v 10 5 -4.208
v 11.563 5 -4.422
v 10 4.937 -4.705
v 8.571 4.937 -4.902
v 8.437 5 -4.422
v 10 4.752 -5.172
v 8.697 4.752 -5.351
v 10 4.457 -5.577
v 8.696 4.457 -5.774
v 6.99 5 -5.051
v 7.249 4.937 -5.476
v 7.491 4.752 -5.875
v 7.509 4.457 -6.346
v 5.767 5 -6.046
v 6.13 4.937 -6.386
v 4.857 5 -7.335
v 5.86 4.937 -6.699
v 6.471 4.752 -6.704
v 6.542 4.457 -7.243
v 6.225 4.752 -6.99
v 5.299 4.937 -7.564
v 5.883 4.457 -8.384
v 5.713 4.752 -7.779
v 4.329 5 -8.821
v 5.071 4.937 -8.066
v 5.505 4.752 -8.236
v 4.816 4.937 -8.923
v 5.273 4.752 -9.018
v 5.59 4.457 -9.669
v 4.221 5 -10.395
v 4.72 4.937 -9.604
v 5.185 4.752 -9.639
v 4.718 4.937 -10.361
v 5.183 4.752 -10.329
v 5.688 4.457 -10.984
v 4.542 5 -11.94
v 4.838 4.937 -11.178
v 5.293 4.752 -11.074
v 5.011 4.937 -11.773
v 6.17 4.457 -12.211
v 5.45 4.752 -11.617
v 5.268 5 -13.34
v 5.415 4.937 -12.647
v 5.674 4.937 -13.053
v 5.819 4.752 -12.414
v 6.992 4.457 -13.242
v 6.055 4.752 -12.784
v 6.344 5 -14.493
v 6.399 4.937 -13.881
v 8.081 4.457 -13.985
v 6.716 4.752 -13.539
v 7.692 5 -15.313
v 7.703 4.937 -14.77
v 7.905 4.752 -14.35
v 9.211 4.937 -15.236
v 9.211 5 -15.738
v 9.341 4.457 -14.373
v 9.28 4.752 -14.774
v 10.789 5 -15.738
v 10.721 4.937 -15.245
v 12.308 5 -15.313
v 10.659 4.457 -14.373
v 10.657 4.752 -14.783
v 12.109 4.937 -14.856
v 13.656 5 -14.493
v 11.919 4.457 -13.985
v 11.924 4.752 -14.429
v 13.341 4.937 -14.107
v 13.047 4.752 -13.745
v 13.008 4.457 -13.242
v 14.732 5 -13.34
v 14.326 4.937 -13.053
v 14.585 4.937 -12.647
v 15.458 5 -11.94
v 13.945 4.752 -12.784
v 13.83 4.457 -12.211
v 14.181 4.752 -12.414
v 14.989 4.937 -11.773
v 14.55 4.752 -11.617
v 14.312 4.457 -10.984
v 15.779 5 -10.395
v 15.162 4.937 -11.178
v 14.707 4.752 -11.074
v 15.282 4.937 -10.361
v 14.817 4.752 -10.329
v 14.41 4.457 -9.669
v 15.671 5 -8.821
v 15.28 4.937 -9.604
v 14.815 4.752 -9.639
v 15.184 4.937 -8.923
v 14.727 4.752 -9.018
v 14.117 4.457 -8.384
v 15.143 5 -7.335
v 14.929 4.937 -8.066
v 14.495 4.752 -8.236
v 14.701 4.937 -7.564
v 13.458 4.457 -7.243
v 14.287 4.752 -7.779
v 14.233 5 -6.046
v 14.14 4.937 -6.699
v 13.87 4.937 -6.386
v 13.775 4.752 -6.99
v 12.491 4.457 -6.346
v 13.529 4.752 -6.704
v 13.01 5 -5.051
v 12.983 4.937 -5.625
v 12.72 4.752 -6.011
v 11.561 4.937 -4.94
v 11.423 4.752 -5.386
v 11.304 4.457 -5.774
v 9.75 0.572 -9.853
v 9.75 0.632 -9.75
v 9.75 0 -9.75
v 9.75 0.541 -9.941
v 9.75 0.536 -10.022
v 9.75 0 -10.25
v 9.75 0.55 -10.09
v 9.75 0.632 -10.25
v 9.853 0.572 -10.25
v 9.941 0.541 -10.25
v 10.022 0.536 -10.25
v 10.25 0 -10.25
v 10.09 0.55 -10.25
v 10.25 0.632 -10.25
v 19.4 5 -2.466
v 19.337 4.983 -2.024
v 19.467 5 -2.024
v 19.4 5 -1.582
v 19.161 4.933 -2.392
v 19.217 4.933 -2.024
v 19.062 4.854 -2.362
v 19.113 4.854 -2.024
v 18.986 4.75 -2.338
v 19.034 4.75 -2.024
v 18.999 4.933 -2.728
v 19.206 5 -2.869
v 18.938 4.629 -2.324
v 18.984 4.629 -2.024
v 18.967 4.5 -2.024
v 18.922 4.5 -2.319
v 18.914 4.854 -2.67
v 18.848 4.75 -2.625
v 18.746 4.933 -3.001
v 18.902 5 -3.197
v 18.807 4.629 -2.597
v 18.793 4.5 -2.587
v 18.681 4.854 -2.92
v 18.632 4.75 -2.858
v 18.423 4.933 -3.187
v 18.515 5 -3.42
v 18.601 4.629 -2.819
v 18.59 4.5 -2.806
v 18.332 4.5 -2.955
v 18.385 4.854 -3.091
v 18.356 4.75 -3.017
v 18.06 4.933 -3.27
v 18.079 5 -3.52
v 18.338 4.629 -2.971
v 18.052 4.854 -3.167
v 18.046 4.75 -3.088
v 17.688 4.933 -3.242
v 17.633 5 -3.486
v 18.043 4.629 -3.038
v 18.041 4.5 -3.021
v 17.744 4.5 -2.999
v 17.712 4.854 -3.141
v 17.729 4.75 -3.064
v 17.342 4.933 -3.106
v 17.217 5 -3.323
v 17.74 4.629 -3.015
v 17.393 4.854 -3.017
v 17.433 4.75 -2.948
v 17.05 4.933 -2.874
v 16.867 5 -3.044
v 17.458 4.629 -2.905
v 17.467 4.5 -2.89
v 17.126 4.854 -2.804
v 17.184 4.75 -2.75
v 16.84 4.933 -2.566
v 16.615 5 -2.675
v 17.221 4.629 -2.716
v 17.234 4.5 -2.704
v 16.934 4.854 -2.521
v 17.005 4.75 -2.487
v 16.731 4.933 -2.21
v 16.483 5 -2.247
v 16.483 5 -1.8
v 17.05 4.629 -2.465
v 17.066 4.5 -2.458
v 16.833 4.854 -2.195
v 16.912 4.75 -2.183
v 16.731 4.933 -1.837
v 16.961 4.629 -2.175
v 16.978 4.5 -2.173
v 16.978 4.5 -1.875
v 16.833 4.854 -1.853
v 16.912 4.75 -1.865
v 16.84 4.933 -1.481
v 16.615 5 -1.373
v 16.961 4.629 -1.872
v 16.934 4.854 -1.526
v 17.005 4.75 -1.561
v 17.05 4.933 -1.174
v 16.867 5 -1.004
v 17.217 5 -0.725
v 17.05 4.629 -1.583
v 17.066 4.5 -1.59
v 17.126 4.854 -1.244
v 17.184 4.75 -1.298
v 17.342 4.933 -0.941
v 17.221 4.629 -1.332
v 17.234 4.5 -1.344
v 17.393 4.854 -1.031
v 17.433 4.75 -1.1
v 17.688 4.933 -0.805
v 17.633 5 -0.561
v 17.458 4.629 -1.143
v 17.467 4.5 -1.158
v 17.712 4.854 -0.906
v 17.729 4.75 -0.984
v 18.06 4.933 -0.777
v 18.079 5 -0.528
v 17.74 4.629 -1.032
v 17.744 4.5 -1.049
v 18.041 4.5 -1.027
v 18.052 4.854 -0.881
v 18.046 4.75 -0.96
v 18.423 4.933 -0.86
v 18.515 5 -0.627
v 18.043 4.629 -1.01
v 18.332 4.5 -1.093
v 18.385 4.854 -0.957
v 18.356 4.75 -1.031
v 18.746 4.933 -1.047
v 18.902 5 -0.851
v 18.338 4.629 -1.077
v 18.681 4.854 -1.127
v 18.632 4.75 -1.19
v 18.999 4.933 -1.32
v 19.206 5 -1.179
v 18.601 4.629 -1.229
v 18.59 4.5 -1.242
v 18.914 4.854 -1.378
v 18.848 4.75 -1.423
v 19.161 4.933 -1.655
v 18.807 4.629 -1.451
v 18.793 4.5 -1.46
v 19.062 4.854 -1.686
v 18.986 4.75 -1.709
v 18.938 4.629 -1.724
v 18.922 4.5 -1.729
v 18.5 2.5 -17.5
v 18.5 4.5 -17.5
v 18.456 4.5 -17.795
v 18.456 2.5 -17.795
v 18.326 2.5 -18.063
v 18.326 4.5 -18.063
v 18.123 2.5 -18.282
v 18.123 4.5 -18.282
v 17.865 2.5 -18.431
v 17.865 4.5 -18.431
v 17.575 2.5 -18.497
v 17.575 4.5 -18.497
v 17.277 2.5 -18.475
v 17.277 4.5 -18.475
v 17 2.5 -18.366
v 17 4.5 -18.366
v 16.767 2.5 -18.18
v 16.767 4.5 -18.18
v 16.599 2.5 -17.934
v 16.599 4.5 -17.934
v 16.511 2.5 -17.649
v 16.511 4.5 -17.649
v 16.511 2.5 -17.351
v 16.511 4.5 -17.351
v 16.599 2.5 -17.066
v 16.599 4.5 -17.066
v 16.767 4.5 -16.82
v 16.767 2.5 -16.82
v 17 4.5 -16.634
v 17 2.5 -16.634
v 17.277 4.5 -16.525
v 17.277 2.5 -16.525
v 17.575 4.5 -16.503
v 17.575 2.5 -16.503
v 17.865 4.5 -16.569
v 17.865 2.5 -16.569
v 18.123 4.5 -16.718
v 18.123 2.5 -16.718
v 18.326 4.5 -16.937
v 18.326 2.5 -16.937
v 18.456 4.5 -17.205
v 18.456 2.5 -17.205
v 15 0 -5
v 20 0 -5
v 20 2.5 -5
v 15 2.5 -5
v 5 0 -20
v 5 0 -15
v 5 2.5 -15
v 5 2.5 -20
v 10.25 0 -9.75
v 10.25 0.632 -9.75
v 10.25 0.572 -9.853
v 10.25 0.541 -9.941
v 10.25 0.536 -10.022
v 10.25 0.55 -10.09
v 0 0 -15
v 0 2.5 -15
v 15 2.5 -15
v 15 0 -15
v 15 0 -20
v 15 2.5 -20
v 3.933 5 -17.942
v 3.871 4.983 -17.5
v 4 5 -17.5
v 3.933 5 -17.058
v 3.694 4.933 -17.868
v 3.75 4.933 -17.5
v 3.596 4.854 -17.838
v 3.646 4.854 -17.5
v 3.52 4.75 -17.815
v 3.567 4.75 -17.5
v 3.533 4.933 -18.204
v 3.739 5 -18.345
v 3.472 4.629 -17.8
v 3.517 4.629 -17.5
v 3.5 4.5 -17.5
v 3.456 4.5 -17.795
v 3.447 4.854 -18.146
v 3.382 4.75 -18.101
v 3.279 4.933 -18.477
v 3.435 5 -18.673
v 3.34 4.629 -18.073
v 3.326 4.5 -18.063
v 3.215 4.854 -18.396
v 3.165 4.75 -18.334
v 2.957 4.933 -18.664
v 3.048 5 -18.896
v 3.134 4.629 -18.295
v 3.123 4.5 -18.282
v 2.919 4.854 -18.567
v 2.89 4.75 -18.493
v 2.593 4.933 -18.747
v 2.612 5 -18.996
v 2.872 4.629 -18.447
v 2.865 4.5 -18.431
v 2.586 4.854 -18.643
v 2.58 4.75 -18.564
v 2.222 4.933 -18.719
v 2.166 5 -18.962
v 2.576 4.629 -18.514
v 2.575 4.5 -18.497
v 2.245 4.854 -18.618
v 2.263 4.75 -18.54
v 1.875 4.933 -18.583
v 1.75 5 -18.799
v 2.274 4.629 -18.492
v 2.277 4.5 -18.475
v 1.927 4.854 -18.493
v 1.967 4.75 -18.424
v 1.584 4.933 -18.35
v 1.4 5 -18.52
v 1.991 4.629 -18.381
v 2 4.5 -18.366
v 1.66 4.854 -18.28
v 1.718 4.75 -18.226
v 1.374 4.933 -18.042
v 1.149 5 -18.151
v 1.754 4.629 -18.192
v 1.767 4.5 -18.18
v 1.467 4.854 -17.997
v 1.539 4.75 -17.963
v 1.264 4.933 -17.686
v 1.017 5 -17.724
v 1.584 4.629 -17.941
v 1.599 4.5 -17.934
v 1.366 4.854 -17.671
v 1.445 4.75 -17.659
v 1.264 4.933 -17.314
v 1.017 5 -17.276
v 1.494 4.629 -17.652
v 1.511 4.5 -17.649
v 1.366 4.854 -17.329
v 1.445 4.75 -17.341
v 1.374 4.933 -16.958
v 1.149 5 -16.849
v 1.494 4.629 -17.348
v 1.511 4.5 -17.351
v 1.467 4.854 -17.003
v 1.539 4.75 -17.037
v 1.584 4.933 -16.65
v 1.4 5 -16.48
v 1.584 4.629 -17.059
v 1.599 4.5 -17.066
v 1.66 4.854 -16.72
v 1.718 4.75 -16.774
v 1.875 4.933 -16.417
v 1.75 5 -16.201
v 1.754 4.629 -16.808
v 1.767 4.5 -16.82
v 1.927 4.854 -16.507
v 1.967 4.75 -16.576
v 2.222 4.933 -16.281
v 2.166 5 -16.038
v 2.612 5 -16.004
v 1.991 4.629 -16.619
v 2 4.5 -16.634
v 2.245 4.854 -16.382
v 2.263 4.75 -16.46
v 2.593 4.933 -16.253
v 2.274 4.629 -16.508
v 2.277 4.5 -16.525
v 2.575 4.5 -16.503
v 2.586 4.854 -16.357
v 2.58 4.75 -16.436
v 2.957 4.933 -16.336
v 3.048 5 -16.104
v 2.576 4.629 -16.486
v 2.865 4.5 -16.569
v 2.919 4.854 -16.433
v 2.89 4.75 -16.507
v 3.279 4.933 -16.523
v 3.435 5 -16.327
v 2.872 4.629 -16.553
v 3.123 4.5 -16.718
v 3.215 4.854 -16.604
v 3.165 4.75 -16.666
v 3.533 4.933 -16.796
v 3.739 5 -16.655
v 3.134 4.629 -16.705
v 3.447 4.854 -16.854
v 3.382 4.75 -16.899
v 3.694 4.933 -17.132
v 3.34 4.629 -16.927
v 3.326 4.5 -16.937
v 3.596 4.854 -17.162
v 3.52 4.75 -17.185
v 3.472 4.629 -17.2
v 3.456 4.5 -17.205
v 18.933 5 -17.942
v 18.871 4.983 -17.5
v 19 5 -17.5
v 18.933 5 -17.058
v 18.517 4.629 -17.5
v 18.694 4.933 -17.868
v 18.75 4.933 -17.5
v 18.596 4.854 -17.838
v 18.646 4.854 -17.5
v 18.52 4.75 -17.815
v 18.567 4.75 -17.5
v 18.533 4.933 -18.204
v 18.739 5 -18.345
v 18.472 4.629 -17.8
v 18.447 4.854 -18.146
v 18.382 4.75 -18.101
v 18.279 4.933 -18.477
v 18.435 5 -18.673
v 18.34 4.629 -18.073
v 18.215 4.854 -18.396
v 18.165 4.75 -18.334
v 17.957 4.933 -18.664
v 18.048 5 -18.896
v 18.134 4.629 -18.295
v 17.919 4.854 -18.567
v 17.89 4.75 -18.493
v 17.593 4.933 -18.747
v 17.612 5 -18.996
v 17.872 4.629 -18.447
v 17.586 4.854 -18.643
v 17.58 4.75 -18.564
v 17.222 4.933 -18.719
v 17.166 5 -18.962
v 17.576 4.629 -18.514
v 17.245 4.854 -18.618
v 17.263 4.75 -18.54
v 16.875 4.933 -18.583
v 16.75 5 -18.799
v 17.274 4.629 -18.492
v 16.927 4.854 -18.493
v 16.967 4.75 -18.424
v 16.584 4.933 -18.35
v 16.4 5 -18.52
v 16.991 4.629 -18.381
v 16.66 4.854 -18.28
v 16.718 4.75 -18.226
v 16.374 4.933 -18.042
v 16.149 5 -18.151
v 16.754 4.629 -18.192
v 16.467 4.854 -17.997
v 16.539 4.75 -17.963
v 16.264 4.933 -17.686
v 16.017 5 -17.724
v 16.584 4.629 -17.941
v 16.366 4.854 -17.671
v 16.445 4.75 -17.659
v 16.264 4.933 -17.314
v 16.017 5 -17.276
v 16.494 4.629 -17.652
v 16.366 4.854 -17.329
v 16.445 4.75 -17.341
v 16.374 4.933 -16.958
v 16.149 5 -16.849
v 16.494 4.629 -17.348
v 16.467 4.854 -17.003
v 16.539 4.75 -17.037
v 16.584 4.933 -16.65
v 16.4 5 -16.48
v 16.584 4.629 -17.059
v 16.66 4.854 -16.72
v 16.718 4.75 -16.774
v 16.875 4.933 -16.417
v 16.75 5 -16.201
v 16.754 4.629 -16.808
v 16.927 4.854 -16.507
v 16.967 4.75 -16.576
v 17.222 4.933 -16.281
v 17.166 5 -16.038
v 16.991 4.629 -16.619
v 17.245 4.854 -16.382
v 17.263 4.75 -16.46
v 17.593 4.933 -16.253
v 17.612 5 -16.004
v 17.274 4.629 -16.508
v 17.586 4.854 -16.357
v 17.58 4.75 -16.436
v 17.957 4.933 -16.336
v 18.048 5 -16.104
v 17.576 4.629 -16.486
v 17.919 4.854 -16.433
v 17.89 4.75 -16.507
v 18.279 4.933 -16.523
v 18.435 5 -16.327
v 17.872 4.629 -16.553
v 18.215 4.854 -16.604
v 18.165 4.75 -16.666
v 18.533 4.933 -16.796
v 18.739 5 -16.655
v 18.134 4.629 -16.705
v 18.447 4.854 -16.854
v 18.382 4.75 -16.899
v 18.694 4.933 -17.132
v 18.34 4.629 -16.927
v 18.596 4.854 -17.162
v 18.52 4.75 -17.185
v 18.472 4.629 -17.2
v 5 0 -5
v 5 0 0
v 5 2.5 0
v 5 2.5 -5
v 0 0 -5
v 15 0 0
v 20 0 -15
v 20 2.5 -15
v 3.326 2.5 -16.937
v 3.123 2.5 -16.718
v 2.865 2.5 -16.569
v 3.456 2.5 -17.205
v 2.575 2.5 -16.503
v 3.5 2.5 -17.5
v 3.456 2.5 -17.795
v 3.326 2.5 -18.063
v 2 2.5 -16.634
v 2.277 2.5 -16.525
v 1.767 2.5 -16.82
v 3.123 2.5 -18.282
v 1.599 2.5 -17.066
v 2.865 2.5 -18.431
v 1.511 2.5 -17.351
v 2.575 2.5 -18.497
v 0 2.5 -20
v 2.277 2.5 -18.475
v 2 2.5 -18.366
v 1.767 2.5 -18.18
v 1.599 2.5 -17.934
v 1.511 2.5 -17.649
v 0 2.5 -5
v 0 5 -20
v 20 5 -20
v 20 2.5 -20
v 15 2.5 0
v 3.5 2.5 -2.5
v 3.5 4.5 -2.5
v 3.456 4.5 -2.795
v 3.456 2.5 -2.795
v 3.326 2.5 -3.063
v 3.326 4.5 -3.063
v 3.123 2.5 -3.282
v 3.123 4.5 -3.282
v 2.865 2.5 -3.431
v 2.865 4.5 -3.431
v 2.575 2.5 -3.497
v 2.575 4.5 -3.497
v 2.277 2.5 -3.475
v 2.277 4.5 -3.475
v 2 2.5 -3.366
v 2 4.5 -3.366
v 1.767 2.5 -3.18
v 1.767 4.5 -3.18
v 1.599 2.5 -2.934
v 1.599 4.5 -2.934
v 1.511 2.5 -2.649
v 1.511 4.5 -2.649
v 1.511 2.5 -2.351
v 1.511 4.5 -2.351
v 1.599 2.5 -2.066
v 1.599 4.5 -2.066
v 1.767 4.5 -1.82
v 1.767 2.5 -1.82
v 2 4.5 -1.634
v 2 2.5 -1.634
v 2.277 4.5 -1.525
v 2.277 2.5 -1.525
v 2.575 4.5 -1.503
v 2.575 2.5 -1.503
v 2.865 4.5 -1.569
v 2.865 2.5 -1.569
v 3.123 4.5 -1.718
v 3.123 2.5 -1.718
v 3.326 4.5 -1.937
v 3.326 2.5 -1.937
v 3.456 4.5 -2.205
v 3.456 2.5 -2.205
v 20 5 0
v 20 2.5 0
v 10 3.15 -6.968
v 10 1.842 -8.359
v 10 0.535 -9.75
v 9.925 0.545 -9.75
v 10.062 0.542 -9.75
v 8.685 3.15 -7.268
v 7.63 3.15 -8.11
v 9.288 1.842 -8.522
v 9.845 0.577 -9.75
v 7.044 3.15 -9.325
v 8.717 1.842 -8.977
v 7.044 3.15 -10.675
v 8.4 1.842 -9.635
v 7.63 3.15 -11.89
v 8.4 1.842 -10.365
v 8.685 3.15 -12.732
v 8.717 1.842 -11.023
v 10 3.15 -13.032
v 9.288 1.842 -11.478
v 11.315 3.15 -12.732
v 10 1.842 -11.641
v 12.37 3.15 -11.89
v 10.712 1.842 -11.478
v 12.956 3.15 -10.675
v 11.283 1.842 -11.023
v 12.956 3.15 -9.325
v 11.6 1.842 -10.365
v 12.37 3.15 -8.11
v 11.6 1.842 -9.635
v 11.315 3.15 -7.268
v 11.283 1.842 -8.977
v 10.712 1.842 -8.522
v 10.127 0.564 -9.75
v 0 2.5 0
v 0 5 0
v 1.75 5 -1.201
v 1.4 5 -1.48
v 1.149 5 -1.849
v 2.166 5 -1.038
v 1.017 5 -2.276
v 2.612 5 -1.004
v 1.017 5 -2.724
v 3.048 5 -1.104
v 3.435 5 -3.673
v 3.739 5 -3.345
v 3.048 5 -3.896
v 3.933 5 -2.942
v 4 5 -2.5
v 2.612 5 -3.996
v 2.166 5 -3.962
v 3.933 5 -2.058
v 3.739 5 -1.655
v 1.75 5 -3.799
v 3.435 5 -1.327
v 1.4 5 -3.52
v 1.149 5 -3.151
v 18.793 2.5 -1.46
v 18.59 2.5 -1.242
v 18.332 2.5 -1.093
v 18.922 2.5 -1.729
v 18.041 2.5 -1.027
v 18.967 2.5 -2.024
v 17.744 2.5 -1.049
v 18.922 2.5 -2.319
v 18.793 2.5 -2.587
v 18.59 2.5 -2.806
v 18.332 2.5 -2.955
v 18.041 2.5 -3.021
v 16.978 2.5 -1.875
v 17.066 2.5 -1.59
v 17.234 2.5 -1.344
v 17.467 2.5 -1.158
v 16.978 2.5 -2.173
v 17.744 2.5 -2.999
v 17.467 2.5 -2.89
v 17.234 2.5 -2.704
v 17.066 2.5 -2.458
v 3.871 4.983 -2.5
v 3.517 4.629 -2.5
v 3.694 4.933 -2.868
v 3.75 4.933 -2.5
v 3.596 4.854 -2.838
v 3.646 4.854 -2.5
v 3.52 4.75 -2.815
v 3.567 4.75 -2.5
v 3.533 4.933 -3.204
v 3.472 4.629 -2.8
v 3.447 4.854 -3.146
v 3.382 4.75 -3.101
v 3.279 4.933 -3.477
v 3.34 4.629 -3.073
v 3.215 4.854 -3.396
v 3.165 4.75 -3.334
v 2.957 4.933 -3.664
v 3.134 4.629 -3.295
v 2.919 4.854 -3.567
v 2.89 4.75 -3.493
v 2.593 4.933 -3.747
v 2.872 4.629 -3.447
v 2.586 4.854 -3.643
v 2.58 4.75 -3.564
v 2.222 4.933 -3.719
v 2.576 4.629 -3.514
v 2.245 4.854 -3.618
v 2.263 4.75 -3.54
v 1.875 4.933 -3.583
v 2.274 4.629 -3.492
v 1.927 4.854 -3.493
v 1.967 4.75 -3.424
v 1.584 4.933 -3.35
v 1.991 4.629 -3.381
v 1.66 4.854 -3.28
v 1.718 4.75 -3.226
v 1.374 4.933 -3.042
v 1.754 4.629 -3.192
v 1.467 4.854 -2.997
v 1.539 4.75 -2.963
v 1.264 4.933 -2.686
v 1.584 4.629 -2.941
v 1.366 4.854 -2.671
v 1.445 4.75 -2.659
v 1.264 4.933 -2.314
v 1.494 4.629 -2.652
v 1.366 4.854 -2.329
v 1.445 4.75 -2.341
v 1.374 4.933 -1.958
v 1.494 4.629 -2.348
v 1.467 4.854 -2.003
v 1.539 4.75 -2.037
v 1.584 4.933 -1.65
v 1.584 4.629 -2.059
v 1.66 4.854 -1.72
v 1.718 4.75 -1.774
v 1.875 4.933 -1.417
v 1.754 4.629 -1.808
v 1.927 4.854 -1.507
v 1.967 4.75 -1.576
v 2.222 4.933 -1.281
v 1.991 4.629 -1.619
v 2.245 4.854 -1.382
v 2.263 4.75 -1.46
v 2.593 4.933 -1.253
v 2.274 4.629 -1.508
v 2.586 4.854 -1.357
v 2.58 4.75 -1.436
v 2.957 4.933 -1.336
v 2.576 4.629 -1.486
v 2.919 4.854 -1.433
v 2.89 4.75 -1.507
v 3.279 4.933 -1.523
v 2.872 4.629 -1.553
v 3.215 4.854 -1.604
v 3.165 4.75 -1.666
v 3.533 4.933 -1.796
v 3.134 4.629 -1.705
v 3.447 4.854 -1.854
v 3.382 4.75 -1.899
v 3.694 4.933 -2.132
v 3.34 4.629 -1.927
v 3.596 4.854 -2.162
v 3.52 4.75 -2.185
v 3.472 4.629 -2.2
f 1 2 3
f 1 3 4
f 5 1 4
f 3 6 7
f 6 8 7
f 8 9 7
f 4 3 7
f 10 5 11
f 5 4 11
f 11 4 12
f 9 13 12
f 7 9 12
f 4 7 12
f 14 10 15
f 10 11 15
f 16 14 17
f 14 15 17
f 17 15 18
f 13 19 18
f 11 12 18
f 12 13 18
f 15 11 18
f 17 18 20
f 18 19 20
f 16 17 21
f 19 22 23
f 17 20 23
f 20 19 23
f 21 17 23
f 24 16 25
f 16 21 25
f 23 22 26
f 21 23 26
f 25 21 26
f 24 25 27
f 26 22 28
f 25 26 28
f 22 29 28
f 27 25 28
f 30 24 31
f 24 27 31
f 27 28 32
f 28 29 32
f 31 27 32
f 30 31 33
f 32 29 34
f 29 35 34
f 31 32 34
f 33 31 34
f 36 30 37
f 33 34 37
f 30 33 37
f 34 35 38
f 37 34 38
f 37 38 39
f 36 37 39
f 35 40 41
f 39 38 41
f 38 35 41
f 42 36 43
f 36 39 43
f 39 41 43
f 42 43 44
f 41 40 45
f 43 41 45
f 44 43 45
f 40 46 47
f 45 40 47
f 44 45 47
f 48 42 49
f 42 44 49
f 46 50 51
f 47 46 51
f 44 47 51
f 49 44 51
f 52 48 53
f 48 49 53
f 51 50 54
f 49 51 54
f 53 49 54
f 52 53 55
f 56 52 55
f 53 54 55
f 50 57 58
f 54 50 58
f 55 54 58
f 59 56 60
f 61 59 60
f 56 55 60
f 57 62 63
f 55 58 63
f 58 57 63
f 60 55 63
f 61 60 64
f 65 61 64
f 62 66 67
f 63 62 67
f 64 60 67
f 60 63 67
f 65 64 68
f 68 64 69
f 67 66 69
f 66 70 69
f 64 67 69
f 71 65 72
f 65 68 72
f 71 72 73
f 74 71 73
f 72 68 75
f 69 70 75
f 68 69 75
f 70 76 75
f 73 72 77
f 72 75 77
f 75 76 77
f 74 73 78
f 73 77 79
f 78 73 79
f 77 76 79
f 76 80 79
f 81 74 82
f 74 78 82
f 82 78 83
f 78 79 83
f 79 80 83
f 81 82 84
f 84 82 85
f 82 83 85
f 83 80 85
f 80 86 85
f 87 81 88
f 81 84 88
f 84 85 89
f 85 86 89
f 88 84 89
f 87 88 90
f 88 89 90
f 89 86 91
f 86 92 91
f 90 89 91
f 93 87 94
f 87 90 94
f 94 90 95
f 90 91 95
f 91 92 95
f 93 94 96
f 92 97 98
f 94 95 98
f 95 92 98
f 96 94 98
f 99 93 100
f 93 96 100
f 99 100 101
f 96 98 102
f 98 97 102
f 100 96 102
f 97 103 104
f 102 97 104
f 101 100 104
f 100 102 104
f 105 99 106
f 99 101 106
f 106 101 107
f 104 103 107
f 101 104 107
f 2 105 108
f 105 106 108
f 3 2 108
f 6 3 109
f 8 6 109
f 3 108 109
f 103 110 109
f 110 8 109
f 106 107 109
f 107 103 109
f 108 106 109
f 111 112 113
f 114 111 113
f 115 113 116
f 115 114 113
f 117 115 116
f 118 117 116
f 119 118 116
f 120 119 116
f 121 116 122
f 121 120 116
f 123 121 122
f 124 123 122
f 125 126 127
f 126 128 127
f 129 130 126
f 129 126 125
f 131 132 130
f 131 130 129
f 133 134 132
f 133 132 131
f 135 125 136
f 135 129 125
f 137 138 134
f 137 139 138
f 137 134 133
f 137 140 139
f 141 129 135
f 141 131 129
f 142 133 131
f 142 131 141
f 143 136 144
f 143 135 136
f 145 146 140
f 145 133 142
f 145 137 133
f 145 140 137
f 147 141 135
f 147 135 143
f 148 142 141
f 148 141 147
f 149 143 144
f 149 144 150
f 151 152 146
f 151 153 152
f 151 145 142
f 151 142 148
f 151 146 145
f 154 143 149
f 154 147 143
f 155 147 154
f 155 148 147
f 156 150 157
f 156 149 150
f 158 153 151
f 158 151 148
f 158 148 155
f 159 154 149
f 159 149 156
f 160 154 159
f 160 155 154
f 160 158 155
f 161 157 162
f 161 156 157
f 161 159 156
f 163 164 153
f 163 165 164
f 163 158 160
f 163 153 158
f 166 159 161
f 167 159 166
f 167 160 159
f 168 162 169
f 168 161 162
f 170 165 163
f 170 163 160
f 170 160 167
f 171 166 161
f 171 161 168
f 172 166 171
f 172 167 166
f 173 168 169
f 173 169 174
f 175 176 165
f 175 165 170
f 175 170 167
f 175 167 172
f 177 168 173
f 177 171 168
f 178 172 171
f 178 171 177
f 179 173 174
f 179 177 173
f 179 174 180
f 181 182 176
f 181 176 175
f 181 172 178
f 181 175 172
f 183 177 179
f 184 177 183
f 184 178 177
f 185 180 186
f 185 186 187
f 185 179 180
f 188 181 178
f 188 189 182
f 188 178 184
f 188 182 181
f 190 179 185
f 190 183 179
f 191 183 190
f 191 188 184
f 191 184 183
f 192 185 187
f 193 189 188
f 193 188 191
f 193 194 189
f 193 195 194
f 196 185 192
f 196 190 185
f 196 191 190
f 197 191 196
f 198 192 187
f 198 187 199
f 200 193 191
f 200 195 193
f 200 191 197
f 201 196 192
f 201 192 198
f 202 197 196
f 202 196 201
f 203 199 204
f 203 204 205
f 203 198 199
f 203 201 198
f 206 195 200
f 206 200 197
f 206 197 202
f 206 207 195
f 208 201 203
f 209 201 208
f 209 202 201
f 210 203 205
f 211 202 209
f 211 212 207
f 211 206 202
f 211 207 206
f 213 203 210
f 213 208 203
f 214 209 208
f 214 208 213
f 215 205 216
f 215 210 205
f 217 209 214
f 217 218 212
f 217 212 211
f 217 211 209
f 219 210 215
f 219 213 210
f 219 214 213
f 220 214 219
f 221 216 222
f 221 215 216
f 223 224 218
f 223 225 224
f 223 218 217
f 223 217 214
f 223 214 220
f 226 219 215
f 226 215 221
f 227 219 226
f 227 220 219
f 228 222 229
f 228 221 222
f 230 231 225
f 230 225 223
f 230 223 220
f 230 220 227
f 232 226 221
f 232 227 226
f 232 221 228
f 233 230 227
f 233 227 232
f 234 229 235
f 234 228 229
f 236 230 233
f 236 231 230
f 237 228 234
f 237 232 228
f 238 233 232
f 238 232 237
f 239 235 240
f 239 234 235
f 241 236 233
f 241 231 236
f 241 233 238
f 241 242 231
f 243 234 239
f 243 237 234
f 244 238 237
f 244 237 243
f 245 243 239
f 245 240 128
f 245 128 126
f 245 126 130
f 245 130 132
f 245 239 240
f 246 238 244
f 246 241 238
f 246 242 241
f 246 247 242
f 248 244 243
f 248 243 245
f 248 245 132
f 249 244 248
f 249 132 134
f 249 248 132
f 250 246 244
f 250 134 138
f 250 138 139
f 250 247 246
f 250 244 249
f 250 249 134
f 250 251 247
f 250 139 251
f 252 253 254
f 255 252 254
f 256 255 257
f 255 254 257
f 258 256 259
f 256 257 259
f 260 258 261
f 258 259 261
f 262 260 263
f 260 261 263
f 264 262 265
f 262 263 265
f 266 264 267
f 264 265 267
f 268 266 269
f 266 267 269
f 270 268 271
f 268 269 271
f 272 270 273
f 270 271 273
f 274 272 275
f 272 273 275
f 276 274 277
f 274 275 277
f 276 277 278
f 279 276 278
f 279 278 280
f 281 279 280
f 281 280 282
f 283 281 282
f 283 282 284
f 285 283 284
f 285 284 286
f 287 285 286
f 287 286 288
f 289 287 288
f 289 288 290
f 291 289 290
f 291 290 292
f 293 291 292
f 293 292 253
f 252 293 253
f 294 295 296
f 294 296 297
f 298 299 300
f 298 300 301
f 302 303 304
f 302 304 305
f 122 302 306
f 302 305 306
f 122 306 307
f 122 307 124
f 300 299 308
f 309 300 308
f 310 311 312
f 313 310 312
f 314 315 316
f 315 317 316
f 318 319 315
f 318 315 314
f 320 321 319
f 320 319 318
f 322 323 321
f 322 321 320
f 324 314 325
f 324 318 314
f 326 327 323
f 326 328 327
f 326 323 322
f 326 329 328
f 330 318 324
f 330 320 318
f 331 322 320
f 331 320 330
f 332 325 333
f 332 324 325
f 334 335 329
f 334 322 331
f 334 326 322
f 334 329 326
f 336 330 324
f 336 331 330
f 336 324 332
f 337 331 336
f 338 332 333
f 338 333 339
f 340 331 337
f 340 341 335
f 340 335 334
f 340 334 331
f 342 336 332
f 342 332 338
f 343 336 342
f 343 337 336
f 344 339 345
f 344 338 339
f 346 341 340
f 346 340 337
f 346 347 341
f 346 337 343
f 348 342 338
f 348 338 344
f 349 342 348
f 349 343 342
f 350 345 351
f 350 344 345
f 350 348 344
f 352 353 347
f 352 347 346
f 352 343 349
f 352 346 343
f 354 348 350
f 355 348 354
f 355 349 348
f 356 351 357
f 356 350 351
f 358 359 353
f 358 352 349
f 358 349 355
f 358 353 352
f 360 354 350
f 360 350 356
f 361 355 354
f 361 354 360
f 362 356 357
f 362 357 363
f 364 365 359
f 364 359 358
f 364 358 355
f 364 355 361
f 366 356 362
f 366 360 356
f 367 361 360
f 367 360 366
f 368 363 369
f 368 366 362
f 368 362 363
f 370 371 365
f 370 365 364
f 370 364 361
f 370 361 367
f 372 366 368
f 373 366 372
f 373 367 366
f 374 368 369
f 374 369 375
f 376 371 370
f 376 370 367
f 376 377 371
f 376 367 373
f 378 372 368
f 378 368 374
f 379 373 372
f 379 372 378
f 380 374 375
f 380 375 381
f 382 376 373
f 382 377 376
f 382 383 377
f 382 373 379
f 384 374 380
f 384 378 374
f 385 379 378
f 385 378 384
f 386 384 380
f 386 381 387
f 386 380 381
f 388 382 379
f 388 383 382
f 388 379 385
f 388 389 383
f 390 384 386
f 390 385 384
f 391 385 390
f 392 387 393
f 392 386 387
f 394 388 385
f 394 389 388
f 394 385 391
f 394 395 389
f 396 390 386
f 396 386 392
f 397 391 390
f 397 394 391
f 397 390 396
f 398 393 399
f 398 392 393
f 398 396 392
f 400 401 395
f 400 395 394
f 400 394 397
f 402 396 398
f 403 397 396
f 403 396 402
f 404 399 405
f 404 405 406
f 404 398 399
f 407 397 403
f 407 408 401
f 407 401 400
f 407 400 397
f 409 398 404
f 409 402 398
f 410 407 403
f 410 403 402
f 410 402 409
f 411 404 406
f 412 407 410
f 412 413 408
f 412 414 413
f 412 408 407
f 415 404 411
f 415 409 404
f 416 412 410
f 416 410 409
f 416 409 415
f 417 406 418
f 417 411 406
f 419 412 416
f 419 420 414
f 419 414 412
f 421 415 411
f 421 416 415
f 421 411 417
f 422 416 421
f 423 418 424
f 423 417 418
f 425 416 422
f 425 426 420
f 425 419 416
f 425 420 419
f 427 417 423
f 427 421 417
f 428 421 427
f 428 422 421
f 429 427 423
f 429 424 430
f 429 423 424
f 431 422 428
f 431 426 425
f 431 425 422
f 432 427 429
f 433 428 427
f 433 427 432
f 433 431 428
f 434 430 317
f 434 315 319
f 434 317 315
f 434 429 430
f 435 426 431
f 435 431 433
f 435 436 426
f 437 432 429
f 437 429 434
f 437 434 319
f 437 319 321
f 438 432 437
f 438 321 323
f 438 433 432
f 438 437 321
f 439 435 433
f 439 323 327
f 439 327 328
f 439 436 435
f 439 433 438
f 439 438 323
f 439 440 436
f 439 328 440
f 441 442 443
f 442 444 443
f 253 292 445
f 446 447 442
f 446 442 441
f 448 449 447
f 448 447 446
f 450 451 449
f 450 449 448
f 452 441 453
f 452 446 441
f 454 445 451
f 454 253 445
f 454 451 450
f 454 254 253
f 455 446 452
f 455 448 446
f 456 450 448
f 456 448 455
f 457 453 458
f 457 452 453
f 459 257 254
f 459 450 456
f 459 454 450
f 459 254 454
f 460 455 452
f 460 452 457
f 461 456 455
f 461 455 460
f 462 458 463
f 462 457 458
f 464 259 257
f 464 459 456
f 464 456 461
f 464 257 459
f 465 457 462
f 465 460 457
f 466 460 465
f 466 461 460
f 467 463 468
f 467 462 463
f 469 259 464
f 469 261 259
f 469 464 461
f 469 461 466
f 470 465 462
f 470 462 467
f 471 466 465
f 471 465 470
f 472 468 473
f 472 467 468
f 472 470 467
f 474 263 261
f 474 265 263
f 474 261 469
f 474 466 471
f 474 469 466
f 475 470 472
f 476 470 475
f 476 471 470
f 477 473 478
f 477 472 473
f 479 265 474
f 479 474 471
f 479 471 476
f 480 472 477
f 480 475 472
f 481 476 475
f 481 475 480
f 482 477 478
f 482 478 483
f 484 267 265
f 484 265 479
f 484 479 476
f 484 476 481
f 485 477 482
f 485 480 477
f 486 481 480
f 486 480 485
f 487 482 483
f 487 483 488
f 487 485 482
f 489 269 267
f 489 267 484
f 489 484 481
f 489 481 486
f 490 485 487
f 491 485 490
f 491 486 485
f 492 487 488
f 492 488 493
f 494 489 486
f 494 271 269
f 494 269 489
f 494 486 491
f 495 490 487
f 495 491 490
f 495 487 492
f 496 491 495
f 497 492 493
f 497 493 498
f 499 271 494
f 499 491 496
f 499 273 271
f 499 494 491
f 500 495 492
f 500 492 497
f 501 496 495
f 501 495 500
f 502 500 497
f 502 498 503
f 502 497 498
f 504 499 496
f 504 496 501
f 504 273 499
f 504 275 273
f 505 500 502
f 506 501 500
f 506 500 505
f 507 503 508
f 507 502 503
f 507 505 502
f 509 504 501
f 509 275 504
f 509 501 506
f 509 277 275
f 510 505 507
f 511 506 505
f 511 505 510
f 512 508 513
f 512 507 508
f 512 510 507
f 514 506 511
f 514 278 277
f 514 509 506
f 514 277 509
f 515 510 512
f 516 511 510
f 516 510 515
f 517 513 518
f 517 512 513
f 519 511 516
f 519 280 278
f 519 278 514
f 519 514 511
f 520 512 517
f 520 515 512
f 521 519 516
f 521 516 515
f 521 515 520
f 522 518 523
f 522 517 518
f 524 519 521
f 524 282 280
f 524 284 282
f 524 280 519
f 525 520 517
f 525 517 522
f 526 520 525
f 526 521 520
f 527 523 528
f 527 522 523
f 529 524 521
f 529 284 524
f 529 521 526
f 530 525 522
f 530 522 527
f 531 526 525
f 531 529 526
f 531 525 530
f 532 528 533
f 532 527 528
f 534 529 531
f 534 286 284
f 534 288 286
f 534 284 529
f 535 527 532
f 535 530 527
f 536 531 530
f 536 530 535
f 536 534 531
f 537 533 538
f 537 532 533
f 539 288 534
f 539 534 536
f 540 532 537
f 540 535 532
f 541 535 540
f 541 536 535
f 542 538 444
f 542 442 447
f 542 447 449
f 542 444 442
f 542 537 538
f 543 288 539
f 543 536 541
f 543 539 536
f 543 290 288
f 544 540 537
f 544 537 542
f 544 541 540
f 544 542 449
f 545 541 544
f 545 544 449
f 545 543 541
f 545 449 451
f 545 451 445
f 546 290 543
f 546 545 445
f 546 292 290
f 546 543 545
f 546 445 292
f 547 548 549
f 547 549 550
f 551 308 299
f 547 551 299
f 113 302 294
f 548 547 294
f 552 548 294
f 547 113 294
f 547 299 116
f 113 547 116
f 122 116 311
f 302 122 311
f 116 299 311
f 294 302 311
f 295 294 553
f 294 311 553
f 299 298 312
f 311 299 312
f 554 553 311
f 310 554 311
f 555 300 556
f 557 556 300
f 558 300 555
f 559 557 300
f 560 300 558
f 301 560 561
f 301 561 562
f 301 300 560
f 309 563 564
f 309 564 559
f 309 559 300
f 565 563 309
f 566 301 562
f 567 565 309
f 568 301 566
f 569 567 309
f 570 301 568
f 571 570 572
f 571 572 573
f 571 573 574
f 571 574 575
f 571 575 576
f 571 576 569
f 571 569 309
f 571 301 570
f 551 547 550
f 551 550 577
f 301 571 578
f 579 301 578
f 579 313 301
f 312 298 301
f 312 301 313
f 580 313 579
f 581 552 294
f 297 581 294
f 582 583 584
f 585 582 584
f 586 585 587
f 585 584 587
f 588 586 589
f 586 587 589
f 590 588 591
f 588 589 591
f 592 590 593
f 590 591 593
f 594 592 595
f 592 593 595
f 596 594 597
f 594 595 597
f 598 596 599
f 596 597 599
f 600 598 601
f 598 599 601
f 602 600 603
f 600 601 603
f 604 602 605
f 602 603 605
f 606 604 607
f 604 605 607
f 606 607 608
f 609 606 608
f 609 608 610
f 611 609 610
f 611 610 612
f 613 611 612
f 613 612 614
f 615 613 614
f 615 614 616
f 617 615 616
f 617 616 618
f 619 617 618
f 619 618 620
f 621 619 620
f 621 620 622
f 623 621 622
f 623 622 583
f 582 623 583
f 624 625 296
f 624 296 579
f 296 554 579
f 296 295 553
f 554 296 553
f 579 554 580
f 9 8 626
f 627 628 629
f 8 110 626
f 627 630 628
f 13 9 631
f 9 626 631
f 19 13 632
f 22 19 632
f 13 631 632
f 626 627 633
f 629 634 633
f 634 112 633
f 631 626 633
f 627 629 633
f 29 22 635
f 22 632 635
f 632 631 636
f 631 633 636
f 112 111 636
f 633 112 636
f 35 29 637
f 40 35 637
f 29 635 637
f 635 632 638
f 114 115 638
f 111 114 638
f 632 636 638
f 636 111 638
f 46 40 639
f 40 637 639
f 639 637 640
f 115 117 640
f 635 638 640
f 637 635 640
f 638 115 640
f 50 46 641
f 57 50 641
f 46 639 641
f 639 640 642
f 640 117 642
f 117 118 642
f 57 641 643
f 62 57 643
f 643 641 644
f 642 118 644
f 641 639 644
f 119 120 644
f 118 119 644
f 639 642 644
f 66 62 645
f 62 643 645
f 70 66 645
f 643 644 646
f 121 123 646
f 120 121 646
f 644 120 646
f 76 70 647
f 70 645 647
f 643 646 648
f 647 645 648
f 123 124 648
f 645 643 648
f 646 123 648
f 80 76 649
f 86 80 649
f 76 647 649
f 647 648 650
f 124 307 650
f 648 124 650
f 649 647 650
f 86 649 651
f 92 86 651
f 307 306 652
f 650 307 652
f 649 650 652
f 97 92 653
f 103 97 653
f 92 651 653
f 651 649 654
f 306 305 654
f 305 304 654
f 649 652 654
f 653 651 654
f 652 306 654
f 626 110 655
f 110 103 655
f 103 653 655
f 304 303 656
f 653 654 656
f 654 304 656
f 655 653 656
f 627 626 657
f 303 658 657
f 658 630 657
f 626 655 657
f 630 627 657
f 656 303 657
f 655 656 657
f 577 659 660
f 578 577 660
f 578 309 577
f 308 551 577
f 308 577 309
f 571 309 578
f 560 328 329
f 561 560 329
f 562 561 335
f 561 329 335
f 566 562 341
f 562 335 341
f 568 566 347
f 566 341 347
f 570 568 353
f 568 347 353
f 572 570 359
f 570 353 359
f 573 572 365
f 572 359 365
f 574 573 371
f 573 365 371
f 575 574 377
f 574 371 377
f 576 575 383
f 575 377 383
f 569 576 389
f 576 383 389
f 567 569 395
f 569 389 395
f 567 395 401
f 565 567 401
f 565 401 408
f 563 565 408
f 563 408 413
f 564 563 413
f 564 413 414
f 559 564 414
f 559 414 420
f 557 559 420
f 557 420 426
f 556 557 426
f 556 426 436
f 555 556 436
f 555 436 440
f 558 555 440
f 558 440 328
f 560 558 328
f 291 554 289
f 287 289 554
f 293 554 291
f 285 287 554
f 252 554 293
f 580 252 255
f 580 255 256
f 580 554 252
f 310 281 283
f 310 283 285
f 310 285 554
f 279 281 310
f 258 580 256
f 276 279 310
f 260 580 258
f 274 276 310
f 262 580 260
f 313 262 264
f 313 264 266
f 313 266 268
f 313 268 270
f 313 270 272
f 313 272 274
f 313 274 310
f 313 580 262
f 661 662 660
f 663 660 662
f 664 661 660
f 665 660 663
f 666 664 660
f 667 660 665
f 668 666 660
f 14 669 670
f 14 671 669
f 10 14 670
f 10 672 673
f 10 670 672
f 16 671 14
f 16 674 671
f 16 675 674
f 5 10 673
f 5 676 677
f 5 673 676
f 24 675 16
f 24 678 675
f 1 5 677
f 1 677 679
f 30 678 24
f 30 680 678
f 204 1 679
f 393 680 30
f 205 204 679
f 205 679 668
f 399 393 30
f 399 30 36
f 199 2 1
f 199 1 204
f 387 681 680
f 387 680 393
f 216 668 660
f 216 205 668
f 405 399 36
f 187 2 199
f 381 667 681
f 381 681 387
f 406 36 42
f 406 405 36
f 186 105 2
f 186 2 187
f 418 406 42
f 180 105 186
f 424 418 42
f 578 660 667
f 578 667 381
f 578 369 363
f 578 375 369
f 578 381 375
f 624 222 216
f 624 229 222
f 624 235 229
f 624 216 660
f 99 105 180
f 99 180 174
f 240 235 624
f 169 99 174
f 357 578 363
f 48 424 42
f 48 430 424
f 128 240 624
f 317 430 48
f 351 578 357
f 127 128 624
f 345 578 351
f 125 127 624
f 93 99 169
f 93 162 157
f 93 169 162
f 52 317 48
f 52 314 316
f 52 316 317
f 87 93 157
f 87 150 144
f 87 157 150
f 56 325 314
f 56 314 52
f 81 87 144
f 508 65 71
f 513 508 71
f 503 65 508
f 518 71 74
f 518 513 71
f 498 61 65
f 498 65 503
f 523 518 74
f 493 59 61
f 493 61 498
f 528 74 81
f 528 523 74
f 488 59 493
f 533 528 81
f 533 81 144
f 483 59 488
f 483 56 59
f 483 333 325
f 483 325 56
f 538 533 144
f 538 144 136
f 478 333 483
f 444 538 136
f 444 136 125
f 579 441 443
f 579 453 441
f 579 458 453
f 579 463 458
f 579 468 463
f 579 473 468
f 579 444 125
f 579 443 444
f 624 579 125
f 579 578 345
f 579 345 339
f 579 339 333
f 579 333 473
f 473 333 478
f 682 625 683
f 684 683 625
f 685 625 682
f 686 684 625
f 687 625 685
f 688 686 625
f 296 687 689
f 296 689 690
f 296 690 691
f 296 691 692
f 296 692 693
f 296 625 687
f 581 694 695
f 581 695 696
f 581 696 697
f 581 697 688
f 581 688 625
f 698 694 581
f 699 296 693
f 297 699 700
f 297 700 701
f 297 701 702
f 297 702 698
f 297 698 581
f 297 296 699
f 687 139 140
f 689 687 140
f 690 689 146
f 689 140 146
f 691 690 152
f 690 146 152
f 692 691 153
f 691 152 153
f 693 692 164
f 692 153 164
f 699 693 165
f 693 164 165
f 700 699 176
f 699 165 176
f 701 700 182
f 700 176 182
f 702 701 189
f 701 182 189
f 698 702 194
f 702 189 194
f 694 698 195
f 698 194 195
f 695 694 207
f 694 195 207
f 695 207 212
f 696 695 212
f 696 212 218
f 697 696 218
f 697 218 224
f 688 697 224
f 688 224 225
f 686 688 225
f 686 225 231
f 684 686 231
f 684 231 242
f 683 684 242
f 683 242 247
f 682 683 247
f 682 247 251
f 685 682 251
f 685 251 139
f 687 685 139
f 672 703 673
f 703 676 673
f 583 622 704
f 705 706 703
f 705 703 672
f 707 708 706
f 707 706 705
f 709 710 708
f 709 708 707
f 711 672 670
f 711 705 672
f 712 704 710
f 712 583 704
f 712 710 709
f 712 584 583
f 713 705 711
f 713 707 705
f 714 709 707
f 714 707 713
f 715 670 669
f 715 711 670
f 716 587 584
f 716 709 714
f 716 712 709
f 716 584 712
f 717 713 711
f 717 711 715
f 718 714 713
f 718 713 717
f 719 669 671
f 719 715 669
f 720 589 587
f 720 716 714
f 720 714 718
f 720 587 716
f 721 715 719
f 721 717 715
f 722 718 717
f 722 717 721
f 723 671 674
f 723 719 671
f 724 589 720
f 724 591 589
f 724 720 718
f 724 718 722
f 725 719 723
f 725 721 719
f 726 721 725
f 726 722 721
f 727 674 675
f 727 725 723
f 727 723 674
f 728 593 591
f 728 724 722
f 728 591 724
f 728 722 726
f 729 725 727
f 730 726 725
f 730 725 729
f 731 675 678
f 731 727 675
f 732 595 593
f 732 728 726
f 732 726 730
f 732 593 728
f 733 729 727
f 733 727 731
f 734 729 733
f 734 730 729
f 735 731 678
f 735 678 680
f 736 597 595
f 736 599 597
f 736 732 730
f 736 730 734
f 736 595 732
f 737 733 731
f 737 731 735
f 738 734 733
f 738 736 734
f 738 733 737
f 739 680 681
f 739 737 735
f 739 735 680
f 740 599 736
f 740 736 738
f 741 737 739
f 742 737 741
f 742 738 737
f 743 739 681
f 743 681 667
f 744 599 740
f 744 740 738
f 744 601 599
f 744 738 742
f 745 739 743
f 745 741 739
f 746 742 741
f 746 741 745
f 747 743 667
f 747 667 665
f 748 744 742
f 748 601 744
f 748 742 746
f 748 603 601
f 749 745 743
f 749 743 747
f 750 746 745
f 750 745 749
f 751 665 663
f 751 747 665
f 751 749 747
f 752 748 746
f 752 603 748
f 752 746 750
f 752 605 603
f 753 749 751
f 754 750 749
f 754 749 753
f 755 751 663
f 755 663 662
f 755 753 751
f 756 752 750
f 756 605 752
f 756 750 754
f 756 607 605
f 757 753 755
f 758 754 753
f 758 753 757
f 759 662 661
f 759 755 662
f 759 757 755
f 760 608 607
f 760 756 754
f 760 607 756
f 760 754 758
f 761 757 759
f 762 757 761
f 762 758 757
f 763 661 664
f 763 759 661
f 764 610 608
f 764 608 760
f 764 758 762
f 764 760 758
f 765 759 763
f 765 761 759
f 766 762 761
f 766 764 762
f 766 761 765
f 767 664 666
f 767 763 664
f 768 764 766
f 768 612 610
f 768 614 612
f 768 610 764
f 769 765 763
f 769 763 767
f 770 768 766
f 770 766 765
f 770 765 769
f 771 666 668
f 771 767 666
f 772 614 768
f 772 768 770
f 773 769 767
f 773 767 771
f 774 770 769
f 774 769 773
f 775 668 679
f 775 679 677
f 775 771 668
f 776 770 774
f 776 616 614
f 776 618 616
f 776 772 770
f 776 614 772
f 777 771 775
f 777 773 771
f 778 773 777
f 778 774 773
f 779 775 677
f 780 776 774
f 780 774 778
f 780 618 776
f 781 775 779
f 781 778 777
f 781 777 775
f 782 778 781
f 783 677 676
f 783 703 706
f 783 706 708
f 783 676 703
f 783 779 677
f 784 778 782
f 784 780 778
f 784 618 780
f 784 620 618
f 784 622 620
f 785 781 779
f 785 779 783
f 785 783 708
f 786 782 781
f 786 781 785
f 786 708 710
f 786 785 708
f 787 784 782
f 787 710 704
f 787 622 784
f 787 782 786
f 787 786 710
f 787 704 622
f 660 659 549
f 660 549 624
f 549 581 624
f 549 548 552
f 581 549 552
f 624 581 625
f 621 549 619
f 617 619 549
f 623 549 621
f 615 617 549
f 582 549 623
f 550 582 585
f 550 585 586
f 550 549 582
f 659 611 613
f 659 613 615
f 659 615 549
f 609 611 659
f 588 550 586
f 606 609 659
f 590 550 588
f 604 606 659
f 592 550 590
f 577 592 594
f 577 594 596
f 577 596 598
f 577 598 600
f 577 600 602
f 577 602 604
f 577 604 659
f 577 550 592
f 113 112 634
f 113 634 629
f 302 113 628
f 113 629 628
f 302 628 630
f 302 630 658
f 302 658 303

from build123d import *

# Parameters (mm, degrees)
SKETCH1_W           = 20
SKETCH1_H           = 20
BOSS_EXTRUDE1_DEPTH = 5
SKETCH4_W           = 0.5
SKETCH4_H           = 0.5
CUT_EXTRUDE1_DEPTH  = 7
FILLET1_R           = 2
SKETCH5_W           = 5
SKETCH5_H           = 5
CUT_EXTRUDE2_DEPTH  = 2.5
SKETCH6_R           = 1
CUT_EXTRUDE3_DEPTH  = 3
FILLET2_R           = 0.5


with BuildPart() as part:
    # Sketch1 → Boss-Extrude1 (new body)
    with BuildSketch(Plane(origin=(0, 0, 0), x_dir=(1, 0, 0), z_dir=(0, 1, 0))):
        with Locations((10, 10)):
            Rectangle(SKETCH1_W, SKETCH1_H)
    extrude(amount=BOSS_EXTRUDE1_DEPTH)

    # Sketch3 → Cut-Revolve3 (revolve, cut)
    with BuildSketch(Plane(origin=(10, 0, 0), x_dir=(0, 0, -1), z_dir=(1, 0, 0))):
        Polygon((10, 0.3), (10, 5), (5, 5), align=None)
    revolve(axis=Axis((10, 5, -10), (0, -1, 0)), mode=Mode.SUBTRACT)

    # Sketch4 → Cut-Extrude1 (cut)
    with BuildSketch(Plane(origin=(0, 5, 0), x_dir=(1, 0, 0), z_dir=(0, 1, 0))):
        with Locations((10, 10)):
            Rectangle(SKETCH4_W, SKETCH4_H)
    extrude(amount=-CUT_EXTRUDE1_DEPTH, mode=Mode.SUBTRACT)

    # Fillet1
    fillet1_edges = [part.edges().sort_by_distance(p)[0] for p in [
        (10, 5, -15),
    ]]
    fillet(fillet1_edges, radius=FILLET1_R)

    # Sketch5 → Cut-Extrude2 (cut)
    with BuildSketch(Plane(origin=(0, 0, 0), x_dir=(-1, 0, 0), z_dir=(0, -1, 0))):
        with Locations((-17.5, 17.5)):
            Rectangle(SKETCH5_W, SKETCH5_H)
        with Locations((-2.5, 17.5)):
            Rectangle(SKETCH5_W, SKETCH5_H)
        with Locations((-17.5, 2.5)):
            Rectangle(SKETCH5_W, SKETCH5_H)
        with Locations((-2.5, 2.5)):
            Rectangle(SKETCH5_W, SKETCH5_H)
    extrude(amount=-CUT_EXTRUDE2_DEPTH, mode=Mode.SUBTRACT)

    # Sketch6 → Cut-Extrude3 (cut)
    with BuildSketch(Plane(origin=(0, 5, 0), x_dir=(1, 0, 0), z_dir=(0, 1, 0))):
        with Locations((17.966640292, 2.023795915)):
            Circle(SKETCH6_R)
        with Locations((17.5, 17.5)):
            Circle(SKETCH6_R)
        with Locations((2.5, 17.5)):
            Circle(SKETCH6_R)
        with Locations((2.5, 2.5)):
            Circle(SKETCH6_R)
    extrude(amount=-CUT_EXTRUDE3_DEPTH, mode=Mode.SUBTRACT)

    # Fillet2
    fillet2_edges = [part.edges().sort_by_distance(p)[0] for p in [
        (16.5, 5, -17.5),
        (1.5, 5, -17.5),
        (1.5, 5, -2.5),
        (16.966640292, 5, -2.023795915),
    ]]
    fillet(fillet2_edges, radius=FILLET2_R)


solid = part.part
